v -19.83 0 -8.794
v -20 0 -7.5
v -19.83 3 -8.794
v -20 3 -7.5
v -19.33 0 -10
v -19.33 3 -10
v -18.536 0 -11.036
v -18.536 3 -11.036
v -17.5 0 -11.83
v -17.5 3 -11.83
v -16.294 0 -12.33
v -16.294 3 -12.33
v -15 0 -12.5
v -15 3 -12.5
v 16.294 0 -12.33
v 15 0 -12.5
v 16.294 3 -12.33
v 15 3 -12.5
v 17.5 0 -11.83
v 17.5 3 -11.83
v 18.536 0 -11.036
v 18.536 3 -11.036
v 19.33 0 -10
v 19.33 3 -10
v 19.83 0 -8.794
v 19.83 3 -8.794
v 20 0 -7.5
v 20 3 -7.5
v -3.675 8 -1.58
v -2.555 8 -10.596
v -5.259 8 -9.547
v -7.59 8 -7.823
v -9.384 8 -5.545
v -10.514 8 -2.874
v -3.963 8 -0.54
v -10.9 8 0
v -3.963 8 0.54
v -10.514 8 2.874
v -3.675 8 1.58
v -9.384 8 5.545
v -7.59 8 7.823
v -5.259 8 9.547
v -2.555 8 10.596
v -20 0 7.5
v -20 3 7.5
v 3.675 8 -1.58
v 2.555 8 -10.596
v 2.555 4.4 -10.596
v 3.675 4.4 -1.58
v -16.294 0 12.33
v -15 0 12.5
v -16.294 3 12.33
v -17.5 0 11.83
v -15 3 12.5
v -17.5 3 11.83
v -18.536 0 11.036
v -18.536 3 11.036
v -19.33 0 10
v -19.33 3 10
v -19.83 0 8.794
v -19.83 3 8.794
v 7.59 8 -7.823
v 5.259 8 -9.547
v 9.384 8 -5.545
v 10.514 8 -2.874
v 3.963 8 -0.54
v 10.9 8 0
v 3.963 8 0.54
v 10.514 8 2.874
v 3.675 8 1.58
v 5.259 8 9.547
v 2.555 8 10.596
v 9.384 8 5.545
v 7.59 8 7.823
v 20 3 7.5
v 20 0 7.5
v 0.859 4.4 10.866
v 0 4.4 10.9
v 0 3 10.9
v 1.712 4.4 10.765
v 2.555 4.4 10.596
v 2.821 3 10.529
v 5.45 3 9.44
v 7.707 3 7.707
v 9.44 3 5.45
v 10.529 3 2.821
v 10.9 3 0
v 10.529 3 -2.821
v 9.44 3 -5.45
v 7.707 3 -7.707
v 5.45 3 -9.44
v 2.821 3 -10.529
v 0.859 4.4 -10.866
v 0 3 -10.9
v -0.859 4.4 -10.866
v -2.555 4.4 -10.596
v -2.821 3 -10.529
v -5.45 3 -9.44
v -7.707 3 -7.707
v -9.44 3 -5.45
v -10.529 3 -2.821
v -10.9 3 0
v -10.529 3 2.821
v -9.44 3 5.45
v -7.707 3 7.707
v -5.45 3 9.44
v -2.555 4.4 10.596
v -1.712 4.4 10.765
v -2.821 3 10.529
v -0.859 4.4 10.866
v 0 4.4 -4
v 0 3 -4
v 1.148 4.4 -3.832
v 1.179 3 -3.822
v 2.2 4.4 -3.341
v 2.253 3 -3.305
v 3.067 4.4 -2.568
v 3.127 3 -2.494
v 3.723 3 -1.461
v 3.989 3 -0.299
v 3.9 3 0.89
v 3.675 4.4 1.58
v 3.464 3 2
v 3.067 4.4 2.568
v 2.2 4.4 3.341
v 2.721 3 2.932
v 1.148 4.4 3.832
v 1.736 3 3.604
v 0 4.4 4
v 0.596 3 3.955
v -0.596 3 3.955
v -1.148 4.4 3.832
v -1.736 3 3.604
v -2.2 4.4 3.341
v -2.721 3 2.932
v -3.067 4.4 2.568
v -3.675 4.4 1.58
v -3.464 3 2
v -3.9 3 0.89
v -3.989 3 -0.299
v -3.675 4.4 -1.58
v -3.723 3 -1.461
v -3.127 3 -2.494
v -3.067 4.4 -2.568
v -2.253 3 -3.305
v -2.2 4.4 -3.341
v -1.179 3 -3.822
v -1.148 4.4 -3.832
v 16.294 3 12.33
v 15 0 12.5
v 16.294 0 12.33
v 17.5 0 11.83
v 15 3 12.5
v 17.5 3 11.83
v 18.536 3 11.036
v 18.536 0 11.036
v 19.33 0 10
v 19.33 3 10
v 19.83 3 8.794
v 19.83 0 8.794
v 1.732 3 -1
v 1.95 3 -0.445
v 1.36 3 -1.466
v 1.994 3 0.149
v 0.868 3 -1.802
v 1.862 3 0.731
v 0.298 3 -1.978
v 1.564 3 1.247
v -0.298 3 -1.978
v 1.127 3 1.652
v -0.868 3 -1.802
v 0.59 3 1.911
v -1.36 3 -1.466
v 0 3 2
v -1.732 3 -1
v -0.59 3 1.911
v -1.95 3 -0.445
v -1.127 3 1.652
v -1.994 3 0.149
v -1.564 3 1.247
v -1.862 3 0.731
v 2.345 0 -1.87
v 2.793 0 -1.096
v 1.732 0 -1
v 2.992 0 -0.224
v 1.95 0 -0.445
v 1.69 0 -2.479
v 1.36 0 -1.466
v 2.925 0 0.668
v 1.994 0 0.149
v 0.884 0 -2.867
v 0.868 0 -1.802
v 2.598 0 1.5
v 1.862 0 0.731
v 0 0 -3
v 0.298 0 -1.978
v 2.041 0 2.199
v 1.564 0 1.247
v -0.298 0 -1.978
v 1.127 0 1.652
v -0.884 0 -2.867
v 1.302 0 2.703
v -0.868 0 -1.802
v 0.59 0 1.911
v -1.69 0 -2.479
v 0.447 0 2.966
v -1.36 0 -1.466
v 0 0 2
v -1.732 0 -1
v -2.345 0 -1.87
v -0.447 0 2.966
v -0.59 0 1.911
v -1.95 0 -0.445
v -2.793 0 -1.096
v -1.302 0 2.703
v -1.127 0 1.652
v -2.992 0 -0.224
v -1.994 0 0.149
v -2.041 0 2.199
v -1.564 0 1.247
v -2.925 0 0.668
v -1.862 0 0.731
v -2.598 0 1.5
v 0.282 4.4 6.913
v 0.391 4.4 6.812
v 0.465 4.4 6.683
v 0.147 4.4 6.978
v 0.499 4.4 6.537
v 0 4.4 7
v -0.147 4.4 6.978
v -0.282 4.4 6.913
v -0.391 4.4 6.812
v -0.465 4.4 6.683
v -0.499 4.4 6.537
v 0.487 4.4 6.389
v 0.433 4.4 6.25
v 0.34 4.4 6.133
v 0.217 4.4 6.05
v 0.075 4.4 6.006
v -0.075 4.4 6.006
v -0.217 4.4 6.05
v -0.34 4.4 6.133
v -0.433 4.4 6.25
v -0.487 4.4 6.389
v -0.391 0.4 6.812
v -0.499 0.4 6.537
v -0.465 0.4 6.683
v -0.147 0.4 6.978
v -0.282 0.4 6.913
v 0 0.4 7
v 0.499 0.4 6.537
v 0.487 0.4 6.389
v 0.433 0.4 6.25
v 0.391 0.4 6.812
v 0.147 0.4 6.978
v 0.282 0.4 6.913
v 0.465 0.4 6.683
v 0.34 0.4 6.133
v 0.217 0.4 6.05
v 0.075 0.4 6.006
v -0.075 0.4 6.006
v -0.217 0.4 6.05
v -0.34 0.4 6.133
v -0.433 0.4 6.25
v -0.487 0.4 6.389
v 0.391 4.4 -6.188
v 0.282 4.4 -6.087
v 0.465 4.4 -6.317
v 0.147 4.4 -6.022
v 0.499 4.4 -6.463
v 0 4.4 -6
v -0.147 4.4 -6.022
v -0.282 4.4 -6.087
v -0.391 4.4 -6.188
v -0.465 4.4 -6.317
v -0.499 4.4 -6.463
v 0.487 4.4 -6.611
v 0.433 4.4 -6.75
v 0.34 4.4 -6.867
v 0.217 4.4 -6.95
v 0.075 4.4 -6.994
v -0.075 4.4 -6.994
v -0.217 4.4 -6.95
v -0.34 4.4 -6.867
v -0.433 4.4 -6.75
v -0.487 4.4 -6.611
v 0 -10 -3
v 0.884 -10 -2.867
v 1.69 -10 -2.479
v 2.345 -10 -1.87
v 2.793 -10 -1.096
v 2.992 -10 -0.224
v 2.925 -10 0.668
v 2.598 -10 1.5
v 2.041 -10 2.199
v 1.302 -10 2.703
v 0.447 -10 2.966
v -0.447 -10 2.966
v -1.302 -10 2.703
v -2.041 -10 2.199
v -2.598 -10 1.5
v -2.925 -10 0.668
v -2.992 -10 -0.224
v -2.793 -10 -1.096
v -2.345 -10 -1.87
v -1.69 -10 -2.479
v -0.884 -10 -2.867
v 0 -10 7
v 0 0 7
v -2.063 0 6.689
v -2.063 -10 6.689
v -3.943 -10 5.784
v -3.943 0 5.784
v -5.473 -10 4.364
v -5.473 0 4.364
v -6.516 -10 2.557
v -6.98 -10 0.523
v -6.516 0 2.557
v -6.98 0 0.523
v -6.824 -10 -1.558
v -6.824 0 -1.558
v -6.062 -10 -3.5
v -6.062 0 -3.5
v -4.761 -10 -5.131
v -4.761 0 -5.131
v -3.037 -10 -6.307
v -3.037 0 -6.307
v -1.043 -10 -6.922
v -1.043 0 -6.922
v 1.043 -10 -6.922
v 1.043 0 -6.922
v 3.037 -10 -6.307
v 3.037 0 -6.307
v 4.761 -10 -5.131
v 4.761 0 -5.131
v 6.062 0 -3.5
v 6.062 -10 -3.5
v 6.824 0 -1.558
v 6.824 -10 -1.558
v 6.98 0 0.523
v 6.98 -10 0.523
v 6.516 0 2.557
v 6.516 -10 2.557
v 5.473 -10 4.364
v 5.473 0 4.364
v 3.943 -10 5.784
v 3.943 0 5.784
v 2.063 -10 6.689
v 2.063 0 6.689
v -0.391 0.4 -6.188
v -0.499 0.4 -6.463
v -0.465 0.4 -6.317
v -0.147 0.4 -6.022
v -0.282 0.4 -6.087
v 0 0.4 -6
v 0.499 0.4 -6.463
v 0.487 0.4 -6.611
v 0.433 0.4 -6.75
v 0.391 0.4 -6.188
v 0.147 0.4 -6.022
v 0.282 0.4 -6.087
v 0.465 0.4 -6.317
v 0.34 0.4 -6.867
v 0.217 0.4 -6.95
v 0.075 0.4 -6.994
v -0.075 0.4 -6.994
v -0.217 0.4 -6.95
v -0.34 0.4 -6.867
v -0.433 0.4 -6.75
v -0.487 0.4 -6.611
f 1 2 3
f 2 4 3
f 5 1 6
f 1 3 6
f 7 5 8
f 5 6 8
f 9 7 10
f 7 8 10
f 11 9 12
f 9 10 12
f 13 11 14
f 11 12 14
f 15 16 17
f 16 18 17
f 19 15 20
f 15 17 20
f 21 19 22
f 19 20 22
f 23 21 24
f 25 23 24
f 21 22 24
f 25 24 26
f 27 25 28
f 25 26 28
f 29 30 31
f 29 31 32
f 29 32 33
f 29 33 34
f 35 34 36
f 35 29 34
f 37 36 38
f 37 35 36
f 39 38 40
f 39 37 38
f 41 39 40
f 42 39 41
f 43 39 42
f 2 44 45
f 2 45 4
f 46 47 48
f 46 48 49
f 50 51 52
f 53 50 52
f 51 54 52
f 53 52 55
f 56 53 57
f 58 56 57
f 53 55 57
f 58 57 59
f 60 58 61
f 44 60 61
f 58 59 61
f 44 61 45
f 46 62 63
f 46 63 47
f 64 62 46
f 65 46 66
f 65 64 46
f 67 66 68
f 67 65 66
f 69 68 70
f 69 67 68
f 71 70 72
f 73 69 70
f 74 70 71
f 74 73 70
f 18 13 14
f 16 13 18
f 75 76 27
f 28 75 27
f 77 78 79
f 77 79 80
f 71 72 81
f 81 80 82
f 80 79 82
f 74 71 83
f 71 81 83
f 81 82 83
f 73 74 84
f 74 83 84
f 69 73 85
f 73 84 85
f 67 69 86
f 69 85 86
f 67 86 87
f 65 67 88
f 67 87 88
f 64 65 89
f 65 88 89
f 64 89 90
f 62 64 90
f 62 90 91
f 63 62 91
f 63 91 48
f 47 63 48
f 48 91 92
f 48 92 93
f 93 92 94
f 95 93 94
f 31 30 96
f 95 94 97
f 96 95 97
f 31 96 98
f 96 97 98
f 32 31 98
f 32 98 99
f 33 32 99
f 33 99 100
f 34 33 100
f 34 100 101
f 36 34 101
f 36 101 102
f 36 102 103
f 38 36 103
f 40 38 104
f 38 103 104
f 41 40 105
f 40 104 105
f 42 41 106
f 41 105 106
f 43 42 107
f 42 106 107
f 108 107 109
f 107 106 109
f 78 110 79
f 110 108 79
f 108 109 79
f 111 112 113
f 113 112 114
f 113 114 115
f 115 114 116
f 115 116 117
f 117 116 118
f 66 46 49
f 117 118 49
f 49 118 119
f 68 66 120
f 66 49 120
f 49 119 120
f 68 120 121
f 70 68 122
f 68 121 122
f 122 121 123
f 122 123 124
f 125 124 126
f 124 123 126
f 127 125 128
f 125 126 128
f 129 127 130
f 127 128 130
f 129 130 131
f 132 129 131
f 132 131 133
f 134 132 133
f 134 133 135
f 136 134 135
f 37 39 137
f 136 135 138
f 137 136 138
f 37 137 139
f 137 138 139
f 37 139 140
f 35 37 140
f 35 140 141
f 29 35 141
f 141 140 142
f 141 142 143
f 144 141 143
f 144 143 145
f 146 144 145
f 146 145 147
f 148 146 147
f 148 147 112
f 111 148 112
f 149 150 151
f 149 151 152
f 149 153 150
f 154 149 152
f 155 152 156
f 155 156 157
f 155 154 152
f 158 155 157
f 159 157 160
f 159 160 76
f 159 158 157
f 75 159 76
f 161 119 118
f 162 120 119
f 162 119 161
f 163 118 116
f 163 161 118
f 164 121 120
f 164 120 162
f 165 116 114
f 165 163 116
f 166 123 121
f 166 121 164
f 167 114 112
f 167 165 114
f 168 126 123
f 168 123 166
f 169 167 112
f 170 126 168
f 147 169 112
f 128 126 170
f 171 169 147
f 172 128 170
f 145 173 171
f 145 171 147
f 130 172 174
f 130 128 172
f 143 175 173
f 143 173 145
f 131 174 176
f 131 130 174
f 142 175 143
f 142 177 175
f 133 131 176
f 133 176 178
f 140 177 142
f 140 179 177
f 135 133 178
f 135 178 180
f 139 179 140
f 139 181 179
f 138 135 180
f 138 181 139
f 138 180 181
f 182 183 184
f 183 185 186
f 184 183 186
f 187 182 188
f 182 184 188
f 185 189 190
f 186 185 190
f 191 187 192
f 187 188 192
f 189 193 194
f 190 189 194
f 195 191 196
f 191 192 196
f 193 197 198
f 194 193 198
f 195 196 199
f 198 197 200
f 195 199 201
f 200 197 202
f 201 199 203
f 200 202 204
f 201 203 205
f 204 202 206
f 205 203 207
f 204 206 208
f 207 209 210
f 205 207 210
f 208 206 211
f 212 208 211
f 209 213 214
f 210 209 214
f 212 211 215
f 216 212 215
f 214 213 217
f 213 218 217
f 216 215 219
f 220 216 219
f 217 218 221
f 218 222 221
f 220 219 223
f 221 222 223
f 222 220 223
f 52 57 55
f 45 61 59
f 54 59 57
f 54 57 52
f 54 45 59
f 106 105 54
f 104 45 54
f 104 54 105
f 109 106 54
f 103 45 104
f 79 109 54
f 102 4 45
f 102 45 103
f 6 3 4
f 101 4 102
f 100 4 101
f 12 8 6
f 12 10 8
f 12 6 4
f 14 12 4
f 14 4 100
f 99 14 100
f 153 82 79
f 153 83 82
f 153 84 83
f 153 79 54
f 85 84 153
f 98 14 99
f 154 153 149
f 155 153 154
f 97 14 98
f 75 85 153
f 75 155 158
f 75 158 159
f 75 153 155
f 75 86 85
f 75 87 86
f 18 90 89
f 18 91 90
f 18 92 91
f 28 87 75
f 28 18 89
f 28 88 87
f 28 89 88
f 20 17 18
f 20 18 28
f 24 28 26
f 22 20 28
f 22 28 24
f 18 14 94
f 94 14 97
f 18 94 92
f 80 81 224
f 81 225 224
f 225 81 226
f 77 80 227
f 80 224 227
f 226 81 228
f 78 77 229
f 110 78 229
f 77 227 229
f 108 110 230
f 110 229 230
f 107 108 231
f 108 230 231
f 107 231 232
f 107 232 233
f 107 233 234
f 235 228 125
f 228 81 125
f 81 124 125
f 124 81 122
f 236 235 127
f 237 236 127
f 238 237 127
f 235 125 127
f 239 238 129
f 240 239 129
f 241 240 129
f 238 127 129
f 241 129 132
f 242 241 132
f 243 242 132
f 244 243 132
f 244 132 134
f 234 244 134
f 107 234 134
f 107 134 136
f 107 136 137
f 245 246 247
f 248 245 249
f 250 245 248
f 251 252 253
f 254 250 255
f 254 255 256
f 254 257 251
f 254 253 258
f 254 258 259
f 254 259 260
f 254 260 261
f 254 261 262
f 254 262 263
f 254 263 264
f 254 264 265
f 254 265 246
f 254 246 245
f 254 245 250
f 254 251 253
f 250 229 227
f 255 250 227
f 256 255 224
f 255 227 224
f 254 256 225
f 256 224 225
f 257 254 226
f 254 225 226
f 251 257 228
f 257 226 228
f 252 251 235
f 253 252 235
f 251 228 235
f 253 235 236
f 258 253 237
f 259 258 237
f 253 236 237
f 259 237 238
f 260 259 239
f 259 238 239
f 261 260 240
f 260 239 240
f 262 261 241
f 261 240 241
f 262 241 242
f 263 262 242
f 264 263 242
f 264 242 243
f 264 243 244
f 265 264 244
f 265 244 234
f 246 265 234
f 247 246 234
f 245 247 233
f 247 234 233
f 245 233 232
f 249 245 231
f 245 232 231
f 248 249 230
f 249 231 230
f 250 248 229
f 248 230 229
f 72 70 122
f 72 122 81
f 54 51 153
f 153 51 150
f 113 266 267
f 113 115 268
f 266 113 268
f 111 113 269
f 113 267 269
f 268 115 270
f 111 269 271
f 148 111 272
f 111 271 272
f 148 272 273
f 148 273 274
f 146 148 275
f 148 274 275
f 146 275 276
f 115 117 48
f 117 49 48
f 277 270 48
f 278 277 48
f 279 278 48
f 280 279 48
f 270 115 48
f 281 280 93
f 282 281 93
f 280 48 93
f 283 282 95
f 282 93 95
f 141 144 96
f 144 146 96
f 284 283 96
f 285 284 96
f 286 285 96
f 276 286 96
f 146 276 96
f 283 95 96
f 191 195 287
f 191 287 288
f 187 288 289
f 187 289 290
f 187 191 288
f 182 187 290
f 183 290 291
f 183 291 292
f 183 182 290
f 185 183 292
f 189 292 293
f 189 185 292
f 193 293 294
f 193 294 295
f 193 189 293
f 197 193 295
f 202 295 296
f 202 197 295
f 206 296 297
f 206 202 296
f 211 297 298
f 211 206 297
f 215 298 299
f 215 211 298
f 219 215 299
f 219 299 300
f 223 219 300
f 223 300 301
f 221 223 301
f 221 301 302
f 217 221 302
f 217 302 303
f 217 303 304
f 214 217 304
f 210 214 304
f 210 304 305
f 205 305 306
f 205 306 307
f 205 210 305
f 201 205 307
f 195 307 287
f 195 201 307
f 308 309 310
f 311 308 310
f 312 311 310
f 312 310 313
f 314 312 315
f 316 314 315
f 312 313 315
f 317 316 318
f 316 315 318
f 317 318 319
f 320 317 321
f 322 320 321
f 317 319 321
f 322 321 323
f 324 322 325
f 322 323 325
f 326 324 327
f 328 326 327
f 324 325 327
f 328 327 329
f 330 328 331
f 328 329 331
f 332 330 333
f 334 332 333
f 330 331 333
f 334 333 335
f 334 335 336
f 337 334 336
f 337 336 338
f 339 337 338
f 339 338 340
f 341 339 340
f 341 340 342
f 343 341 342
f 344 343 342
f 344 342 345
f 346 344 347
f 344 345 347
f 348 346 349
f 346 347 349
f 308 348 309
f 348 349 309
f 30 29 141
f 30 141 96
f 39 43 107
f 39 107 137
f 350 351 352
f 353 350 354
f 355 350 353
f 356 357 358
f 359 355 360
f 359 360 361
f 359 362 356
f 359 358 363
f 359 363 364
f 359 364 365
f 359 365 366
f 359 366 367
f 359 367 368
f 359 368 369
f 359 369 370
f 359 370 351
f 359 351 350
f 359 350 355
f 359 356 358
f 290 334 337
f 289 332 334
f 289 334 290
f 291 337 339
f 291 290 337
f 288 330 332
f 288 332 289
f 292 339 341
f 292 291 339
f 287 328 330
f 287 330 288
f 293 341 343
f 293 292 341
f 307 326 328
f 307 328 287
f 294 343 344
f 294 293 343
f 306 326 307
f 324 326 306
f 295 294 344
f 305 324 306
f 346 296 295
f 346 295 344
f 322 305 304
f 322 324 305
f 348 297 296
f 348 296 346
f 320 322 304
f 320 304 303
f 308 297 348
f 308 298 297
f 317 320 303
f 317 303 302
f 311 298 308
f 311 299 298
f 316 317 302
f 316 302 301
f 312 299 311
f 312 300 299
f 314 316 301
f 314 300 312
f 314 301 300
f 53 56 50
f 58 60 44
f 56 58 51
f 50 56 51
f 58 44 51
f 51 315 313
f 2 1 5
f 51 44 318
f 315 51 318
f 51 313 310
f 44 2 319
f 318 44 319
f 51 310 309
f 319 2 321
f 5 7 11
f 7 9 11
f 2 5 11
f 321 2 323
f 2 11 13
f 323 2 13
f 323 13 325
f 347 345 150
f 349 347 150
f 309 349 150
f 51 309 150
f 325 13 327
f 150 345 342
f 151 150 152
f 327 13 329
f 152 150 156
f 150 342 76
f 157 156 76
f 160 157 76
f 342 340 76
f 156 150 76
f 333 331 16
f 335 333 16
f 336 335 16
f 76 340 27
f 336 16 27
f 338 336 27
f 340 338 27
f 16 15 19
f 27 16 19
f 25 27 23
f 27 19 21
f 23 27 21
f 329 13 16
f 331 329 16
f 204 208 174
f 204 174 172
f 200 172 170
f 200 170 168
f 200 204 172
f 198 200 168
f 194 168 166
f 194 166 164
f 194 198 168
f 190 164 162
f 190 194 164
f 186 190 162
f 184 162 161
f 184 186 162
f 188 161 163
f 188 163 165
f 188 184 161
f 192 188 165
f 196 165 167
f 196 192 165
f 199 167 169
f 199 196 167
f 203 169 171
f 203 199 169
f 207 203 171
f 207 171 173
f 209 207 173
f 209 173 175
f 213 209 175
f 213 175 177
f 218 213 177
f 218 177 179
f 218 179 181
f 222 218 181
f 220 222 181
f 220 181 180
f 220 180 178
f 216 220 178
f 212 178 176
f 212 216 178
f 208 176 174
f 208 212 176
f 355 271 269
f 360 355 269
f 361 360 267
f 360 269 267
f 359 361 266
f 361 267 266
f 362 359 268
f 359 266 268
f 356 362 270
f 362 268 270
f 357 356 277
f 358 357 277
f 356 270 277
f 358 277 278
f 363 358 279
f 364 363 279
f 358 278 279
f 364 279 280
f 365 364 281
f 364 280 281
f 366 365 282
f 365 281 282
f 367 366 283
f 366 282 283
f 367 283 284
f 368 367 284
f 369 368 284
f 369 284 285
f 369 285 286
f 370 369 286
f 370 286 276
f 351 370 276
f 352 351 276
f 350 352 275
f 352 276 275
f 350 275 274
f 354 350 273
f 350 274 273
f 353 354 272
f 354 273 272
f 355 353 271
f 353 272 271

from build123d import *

# Parameters (mm, degrees)
SKETCH_1_W          = 40
SKETCH_1_H          = 25
EXTRUDE_1_DEPTH     = 3
SKETCH_2_R          = 10.9
EXTRUDE_2_DEPTH     = 5
SKETCH_3_R          = 4
CUT_EXTRUDE_1_DEPTH = 25.904818811
CUT_EXTRUDE_2_DEPTH = 3.6
SKETCH_5_R          = 0.5
CUT_EXTRUDE_3_DEPTH = 4
FILLET_1_R          = 5
FILLET_2_R          = 5
FILLET_3_R          = 5
FILLET_4_R          = 5
SKETCH_6_R          = 7
SKETCH_6_R_2        = 3
EXTRUDE_3_DEPTH     = 10
SKETCH_7_R          = 4
SKETCH_7_R_2        = 2
EXTRUDE_4_DEPTH     = 3


with BuildPart() as part:
    # 草图1 → 凸台-拉伸1 (new body)
    with BuildSketch(Plane(origin=(0, 0, 0), x_dir=(1, 0, 0), z_dir=(0, 1, 0))):
        Rectangle(SKETCH_1_W, SKETCH_1_H)
    extrude(amount=EXTRUDE_1_DEPTH)

    # 草图2 → 凸台-拉伸2 (add)
    with BuildSketch(Plane(origin=(0, 3, 0), x_dir=(1, 0, 0), z_dir=(0, 1, 0))):
        with Locations(Location((0, 0, 0), (0, 0, 270))):
            Circle(SKETCH_2_R)
    extrude(amount=EXTRUDE_2_DEPTH)

    # 草图3 → 切除-拉伸1 (cut, through all)
    with BuildSketch(Plane.XZ):
        with Locations(Location((0, 0, 0), (0, 0, 270))):
            Circle(SKETCH_3_R)
    extrude(amount=-CUT_EXTRUDE_1_DEPTH, mode=Mode.SUBTRACT)

    # 草图4 → 切除-拉伸2 (cut)
    with BuildSketch(Plane(origin=(0, 8, 0), x_dir=(1, 0, 0), z_dir=(0, 1, 0))):
        Polygon((3.674809939, -1.579801226), (2.341337155, -12.320336373), (-2.341337155, -12.320336373), (-3.674809939, -1.579801226), align=None)
        Polygon((-3.674809939, 1.579801226), (-2.341337155, 12.320336373), (2.341337155, 12.320336373), (3.674809939, 1.579801226), align=None)
    extrude(amount=-CUT_EXTRUDE_2_DEPTH, mode=Mode.SUBTRACT)

    # 草图5 → 切除-拉伸3 (cut)
    with BuildSketch(Plane(origin=(0, 4.4, 0), x_dir=(1, 0, 0), z_dir=(0, 1, 0))):
        with Locations(Location((0, -6.5, 0), (0, 0, 270))):
            Circle(SKETCH_5_R)
        with Locations(Location((0, 6.5, 0), (0, 0, 270))):
            Circle(SKETCH_5_R)
    extrude(amount=-CUT_EXTRUDE_3_DEPTH, mode=Mode.SUBTRACT)

    # 圆角1
    fillet_1_edges = [part.edges().sort_by_distance(p)[0] for p in [
        (20, 1.5, 12.5),
    ]]
    fillet(fillet_1_edges, radius=FILLET_1_R)

    # 圆角2
    fillet_2_edges = [part.edges().sort_by_distance(p)[0] for p in [
        (-20, 1.5, 12.5),
    ]]
    fillet(fillet_2_edges, radius=FILLET_2_R)

    # 圆角3
    fillet_3_edges = [part.edges().sort_by_distance(p)[0] for p in [
        (-20, 1.5, -12.5),
    ]]
    fillet(fillet_3_edges, radius=FILLET_3_R)

    # 圆角4
    fillet_4_edges = [part.edges().sort_by_distance(p)[0] for p in [
        (20, 1.5, -12.5),
    ]]
    fillet(fillet_4_edges, radius=FILLET_4_R)

    # 草图6 → 凸台-拉伸3 (add)
    with BuildSketch(Plane(origin=(0, 0, 0), x_dir=(-1, 0, 0), z_dir=(0, -1, 0))):
        with Locations(Location((0, 0, 0), (0, 0, 270))):
            Circle(SKETCH_6_R)
        with Locations(Location((0, 0, 0), (0, 0, 90))):
            Circle(SKETCH_6_R_2, mode=Mode.SUBTRACT)
    extrude(amount=EXTRUDE_3_DEPTH)

    # 草图7 → 凸台-拉伸4 (add)
    with BuildSketch(Plane(origin=(0, 0, 0), x_dir=(1, 0, 0), z_dir=(0, 1, 0))):
        with Locations(Location((0, 0, 0), (0, 0, 156.73712516))):
            Circle(SKETCH_7_R)
        with Locations(Location((0, 0, 0), (0, 0, 270))):
            Circle(SKETCH_7_R_2, mode=Mode.SUBTRACT)
    extrude(amount=EXTRUDE_4_DEPTH)


solid = part.part
